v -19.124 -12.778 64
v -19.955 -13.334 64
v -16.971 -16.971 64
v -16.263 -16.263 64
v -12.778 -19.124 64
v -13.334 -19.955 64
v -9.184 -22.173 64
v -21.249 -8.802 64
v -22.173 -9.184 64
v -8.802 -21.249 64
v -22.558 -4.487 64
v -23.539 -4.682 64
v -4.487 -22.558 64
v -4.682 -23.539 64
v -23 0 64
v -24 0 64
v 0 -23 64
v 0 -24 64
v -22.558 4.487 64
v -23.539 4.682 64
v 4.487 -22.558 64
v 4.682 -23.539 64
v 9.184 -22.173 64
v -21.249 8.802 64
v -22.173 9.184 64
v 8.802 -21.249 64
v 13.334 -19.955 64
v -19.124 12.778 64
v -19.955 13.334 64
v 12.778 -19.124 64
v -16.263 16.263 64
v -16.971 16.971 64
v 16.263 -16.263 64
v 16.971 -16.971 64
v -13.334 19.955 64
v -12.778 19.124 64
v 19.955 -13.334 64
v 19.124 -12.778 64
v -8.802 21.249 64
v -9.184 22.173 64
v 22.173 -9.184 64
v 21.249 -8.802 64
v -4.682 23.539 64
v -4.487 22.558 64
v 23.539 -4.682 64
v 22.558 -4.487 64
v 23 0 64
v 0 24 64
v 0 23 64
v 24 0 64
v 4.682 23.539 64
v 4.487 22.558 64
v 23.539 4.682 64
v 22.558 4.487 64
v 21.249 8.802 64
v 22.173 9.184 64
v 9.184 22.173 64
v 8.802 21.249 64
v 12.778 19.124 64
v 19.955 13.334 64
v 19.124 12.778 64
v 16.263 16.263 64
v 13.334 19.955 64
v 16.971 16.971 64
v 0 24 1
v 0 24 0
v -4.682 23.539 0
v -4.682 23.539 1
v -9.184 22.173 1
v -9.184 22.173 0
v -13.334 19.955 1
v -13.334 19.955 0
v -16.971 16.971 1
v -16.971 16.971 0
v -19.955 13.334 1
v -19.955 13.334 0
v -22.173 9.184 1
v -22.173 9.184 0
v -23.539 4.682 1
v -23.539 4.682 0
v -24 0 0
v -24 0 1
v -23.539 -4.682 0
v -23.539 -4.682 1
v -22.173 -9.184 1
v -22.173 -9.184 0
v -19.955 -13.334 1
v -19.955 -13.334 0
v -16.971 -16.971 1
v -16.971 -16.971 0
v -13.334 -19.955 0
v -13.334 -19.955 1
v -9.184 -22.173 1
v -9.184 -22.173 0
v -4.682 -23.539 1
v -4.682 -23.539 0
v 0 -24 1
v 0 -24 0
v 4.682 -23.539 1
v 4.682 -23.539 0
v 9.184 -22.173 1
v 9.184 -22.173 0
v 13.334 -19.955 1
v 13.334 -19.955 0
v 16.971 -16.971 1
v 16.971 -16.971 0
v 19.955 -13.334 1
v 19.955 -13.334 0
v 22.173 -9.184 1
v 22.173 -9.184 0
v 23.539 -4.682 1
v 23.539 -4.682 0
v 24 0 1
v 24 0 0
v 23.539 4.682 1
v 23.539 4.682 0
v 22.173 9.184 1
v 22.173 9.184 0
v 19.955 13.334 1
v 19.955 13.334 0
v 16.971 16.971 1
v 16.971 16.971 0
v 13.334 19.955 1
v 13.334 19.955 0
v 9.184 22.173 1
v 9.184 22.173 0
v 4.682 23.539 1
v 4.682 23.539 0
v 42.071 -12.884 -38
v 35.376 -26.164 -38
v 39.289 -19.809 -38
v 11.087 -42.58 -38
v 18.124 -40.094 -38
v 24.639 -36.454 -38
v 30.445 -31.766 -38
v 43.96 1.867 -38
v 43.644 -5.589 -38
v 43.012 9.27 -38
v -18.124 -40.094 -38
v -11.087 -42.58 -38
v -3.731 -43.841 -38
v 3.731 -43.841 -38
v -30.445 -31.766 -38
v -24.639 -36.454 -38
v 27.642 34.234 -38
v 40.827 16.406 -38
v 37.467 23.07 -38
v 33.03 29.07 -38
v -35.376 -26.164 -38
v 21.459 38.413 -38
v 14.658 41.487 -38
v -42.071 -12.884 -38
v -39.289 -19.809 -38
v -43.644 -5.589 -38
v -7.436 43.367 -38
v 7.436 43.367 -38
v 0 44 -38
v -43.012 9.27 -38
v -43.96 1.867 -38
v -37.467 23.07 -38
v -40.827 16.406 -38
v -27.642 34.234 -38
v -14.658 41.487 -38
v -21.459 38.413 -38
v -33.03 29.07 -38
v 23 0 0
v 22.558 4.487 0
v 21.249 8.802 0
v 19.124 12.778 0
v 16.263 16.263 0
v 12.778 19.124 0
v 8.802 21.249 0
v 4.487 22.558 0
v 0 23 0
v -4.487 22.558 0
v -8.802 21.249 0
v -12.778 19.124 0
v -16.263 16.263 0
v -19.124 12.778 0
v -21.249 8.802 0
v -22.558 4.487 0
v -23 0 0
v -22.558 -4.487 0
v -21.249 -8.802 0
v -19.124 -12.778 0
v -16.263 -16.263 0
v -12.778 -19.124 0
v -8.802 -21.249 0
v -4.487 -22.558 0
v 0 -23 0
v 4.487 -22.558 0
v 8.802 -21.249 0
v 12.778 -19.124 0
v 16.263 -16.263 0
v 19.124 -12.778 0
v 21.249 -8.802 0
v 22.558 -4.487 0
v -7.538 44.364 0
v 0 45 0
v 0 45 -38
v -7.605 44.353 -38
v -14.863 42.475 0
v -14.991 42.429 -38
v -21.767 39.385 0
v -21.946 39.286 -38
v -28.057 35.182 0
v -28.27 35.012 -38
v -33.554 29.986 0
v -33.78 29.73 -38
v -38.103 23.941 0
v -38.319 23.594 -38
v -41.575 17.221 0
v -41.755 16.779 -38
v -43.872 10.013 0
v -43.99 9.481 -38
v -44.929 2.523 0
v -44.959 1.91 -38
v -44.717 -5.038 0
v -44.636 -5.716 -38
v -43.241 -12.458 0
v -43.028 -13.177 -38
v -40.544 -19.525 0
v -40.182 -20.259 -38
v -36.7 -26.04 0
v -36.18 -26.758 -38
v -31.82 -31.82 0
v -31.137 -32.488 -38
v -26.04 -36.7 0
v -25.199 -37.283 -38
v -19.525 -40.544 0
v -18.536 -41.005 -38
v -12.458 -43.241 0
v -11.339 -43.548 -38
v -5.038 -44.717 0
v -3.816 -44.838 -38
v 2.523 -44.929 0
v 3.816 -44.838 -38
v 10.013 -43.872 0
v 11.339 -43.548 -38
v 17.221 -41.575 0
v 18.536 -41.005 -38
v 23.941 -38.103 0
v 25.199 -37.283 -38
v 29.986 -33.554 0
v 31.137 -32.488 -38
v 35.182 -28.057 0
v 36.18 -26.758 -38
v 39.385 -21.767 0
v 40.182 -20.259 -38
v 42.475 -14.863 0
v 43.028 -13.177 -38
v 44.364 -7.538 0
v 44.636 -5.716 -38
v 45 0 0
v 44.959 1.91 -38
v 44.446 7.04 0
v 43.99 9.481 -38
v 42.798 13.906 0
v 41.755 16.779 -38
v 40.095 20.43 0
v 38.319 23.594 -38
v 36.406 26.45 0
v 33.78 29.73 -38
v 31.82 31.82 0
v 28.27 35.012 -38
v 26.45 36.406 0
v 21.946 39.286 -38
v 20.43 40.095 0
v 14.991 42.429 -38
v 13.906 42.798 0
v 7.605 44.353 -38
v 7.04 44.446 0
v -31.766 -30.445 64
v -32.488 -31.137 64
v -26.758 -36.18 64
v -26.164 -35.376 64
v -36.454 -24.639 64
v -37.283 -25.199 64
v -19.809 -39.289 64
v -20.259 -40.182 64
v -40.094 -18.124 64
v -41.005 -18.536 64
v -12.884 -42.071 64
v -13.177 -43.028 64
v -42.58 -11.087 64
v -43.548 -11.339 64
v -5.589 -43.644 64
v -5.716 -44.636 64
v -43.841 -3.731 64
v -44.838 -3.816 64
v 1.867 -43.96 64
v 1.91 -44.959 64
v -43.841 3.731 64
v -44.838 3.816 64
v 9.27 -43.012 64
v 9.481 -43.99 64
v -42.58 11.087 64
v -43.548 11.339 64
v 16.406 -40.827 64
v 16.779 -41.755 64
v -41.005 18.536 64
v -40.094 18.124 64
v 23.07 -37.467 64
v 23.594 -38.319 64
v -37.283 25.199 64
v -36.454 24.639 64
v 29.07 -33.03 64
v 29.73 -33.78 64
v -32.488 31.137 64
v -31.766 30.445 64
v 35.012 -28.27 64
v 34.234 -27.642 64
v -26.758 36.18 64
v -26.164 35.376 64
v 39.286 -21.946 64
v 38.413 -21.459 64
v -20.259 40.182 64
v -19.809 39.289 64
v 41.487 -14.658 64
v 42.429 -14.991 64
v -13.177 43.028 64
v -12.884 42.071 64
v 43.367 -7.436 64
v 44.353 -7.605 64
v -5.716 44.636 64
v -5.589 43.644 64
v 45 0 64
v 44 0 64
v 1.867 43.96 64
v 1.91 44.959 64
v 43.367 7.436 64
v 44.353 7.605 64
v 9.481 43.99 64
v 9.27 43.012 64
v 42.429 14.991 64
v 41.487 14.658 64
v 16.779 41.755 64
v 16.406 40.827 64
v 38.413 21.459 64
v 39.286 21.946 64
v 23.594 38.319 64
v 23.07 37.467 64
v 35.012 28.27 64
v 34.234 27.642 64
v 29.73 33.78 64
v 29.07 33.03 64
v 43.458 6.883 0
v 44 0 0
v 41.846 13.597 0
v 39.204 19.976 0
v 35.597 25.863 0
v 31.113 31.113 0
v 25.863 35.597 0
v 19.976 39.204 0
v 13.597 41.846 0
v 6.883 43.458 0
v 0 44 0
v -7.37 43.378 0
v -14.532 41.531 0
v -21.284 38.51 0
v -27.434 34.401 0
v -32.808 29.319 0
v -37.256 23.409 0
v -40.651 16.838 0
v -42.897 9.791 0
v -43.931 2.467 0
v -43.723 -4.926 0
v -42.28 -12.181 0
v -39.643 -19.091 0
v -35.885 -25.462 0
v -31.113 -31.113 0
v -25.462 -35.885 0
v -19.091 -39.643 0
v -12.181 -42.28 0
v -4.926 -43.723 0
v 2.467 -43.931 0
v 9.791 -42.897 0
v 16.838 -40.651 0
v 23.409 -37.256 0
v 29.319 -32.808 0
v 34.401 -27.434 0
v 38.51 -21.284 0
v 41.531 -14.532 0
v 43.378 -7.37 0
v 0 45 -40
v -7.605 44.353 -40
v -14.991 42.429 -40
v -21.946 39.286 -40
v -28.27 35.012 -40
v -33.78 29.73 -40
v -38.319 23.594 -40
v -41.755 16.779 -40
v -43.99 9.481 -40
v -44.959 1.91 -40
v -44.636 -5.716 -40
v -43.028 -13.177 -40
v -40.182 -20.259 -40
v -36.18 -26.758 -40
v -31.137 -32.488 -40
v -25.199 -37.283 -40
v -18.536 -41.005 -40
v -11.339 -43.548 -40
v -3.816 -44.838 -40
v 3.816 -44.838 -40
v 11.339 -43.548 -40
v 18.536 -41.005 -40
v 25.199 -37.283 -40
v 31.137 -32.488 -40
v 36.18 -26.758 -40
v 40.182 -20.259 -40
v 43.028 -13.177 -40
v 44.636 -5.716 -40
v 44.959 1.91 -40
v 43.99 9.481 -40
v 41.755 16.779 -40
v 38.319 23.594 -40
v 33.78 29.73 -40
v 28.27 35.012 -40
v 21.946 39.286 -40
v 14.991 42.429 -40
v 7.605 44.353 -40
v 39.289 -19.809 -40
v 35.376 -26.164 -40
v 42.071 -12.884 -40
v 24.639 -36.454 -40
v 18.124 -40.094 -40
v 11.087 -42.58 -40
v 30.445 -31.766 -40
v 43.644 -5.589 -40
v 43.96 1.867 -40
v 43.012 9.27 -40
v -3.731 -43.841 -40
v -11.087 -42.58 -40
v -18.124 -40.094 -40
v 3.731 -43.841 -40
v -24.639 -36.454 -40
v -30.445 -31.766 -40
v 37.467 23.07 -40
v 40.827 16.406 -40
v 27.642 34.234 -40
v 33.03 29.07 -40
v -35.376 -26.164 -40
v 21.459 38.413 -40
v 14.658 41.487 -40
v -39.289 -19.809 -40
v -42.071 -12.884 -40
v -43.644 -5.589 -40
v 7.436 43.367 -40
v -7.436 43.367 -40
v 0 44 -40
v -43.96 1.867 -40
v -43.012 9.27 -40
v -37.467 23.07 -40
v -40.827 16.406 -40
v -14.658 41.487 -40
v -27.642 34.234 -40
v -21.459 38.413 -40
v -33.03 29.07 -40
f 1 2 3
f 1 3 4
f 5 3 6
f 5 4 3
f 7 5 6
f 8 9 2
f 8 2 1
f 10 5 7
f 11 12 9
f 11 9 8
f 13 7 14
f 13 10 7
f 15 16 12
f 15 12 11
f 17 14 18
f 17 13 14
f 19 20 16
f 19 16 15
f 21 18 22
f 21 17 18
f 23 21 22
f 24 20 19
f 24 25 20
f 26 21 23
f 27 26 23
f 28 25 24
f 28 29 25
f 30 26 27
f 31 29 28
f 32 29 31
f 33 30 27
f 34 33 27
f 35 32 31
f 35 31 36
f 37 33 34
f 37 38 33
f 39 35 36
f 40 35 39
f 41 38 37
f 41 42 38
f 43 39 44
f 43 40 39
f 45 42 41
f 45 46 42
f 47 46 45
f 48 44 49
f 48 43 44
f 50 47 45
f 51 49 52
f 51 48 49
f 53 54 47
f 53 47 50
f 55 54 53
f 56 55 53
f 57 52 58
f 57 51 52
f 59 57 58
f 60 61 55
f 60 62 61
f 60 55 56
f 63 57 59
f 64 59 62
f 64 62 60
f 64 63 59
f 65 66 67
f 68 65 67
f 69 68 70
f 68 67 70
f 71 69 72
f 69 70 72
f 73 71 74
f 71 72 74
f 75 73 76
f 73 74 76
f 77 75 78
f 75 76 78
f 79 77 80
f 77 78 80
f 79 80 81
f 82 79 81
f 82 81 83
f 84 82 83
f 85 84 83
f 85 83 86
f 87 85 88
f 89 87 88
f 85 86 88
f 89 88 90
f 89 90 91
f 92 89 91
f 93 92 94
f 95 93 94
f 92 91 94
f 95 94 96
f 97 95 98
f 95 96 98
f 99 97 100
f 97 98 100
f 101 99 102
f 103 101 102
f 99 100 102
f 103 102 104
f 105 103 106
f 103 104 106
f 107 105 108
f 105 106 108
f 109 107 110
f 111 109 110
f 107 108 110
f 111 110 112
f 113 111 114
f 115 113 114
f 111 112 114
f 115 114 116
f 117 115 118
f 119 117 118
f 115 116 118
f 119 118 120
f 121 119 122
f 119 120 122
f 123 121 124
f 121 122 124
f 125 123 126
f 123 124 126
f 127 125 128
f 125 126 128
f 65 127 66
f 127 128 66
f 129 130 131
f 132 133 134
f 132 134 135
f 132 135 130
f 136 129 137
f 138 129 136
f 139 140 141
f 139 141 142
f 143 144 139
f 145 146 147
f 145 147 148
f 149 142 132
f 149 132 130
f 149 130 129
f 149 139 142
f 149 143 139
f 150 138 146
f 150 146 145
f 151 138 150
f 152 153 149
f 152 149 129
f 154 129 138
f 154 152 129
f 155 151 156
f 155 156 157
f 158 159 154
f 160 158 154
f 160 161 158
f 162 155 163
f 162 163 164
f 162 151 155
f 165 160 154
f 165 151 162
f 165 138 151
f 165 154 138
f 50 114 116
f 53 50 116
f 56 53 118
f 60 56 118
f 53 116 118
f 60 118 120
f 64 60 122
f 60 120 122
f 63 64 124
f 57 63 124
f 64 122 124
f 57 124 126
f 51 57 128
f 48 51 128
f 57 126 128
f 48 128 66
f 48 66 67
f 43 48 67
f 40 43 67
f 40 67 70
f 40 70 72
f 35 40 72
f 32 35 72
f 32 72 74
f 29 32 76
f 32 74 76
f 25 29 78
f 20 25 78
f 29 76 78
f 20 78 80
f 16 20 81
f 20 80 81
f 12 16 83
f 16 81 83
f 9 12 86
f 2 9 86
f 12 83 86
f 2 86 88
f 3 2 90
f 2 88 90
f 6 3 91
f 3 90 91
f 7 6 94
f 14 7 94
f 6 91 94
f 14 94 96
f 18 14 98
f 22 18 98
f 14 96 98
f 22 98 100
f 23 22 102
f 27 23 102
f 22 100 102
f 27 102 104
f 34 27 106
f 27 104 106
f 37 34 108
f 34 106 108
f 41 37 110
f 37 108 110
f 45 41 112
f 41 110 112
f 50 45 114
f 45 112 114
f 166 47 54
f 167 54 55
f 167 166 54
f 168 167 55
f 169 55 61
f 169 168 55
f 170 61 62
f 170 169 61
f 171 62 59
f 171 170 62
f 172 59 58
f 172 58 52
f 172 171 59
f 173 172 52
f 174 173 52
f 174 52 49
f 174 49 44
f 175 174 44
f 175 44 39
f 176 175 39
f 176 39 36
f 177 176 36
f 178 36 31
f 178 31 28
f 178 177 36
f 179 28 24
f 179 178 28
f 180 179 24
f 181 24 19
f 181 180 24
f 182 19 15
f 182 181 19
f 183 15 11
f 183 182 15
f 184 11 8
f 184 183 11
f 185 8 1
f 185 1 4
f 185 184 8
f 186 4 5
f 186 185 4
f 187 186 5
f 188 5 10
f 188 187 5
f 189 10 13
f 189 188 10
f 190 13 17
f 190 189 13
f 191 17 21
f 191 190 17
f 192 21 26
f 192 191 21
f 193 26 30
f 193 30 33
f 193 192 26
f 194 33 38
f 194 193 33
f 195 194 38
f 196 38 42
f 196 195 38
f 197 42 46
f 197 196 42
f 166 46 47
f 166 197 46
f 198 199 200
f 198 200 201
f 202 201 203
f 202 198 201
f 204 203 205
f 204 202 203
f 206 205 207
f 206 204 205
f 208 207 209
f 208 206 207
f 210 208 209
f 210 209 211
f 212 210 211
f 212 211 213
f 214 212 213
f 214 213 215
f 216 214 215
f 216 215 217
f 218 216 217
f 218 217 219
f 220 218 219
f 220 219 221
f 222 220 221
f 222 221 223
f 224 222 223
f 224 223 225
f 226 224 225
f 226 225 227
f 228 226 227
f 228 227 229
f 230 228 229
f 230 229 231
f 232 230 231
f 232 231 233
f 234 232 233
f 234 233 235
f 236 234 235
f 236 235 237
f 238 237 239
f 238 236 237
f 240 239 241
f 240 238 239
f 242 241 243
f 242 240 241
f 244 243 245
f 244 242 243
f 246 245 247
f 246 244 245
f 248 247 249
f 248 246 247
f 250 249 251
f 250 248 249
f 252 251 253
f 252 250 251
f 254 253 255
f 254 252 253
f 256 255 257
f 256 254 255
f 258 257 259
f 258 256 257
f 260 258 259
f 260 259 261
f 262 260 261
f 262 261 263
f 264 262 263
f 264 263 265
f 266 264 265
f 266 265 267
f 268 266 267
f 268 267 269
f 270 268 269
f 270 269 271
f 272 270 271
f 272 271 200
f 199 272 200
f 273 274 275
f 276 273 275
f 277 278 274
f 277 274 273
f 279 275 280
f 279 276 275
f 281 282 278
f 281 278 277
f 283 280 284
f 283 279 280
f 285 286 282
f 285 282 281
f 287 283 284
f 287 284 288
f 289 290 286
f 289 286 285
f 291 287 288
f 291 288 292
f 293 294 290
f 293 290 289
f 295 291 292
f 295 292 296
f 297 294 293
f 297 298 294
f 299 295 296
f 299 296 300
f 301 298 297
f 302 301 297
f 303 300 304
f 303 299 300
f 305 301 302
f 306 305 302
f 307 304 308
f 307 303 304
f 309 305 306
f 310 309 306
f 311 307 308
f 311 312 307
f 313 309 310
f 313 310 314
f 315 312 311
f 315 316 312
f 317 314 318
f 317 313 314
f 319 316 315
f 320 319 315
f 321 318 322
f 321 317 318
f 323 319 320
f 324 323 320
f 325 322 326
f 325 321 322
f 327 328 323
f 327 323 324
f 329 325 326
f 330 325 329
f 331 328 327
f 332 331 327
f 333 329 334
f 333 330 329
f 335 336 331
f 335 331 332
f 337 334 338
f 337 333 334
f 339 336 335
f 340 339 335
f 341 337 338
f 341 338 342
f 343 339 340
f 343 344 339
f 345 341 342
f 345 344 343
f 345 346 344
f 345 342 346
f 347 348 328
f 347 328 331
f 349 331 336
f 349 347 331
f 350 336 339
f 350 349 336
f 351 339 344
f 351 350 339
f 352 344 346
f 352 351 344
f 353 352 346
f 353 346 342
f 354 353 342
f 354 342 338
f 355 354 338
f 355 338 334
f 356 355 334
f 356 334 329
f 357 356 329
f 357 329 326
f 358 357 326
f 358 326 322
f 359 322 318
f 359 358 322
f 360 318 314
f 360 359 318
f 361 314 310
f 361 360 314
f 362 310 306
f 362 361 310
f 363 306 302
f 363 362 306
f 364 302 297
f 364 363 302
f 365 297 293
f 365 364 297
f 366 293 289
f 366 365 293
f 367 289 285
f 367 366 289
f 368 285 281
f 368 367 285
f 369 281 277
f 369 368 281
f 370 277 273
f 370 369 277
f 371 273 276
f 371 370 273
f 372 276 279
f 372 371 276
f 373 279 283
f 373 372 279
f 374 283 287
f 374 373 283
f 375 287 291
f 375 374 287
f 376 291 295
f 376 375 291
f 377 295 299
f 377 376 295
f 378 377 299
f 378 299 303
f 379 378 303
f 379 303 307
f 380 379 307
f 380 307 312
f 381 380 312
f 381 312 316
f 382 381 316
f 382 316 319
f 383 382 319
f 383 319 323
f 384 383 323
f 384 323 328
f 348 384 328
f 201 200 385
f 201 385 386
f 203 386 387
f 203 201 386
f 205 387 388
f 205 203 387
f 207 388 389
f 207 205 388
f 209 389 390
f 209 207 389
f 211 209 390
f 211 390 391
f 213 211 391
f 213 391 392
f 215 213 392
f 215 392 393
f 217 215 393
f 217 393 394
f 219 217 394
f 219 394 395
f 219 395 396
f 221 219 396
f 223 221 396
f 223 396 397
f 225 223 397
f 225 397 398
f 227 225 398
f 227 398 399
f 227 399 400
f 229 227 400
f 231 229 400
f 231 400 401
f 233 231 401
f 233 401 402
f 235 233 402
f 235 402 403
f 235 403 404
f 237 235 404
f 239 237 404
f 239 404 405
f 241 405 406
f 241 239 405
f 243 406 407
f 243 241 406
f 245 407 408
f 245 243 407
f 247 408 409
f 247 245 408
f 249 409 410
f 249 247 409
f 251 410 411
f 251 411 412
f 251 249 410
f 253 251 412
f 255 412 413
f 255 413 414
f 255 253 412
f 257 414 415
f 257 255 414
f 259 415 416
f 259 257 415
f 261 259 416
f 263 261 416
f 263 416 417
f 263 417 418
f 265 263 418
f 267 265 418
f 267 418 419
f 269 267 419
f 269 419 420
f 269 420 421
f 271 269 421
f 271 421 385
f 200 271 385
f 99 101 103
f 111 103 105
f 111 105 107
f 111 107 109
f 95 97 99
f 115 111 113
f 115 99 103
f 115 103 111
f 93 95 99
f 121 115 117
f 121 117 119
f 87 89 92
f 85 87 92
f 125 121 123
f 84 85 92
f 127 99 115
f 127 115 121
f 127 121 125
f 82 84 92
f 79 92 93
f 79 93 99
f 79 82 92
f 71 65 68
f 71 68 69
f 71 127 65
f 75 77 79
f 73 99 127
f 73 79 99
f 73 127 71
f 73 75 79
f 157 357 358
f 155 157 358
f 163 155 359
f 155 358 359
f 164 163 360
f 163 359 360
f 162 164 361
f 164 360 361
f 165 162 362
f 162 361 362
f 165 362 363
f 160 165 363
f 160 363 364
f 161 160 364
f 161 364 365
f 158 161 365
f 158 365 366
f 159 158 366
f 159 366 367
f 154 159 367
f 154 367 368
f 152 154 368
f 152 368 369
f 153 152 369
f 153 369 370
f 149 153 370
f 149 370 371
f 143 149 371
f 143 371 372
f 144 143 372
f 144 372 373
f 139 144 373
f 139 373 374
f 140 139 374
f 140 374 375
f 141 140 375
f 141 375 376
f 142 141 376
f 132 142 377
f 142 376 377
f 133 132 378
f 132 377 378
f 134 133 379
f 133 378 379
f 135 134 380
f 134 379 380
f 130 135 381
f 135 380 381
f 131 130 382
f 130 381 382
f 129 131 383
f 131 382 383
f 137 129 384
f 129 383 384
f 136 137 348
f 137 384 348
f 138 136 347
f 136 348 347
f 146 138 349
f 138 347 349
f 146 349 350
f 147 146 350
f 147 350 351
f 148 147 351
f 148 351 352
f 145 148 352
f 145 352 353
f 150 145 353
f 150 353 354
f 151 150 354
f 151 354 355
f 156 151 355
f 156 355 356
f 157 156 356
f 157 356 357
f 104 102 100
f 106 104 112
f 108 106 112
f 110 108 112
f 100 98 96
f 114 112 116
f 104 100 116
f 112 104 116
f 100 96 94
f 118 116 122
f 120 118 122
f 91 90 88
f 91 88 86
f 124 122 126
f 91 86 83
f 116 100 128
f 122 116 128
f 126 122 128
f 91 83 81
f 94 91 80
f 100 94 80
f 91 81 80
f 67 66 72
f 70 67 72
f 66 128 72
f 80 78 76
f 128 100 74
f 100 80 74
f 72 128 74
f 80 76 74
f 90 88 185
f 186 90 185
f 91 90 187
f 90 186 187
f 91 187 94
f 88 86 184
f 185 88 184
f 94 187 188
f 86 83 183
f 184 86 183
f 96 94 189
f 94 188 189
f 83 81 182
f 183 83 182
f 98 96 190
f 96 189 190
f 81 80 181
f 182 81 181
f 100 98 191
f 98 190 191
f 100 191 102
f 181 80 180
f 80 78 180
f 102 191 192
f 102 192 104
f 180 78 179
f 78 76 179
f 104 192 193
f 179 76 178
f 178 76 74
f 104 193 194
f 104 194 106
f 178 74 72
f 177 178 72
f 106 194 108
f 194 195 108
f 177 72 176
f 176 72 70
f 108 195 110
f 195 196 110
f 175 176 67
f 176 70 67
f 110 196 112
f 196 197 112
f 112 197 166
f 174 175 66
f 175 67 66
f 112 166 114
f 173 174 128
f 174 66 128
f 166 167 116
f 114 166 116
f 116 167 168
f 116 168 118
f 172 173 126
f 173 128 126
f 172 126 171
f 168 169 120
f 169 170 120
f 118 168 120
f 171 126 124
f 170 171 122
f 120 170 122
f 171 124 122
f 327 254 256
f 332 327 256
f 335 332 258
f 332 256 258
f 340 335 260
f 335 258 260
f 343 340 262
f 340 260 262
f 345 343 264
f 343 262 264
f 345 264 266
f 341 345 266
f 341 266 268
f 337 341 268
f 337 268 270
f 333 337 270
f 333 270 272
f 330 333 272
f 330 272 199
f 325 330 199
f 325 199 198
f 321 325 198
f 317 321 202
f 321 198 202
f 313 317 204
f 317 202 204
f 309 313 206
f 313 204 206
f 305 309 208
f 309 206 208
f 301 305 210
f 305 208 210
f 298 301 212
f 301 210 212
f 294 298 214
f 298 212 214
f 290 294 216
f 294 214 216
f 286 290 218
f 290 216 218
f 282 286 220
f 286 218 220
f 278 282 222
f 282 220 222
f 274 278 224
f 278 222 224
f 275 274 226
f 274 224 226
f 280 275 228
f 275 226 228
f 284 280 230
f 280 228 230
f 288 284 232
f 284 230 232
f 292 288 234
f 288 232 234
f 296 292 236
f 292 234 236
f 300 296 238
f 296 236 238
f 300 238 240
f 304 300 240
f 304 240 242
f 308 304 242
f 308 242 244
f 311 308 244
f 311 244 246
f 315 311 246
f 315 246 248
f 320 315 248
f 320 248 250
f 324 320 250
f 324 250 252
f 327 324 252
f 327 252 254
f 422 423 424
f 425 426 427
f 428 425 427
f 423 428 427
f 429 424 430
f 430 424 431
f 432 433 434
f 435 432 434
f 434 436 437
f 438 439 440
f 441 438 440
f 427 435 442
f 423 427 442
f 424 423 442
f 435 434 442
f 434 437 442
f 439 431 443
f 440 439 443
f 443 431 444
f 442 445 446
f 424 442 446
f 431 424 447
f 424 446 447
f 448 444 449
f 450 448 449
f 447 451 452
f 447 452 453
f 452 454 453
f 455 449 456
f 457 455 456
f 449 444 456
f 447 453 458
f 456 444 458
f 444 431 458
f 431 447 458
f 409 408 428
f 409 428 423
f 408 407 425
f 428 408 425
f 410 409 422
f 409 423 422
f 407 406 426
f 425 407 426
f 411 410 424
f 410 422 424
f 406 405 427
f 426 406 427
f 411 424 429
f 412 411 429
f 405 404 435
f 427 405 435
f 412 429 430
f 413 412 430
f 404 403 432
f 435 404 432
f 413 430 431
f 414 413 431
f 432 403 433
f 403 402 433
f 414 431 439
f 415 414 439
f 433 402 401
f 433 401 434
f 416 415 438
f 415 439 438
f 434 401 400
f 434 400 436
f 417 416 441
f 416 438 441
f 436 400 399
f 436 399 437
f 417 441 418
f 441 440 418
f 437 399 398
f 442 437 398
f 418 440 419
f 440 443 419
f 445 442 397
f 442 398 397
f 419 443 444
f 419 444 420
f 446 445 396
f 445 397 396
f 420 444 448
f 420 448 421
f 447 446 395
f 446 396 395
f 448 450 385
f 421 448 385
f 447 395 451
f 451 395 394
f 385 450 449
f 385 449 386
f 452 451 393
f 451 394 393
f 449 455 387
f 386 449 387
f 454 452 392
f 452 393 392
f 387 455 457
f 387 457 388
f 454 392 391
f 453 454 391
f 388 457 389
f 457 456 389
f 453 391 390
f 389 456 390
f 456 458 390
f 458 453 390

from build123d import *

# Parameters (mm, degrees)
BINDER_R      = 24
PAD002_DEPTH  = 1
SKETCH_R      = 24
SKETCH_R_2    = 23
PAD_DEPTH     = 64
SKETCH001_R   = 45
SKETCH001_R_2 = 44
PAD001_DEPTH  = 64
BINDER001_R   = 45
BINDER001_R_2 = 44
PAD003_DEPTH  = 40
BINDER002_R   = 45
PAD004_DEPTH  = 2


with BuildPart() as body:
    # Binder → Pad002 (new body)
    with BuildSketch(Plane(origin=(0, 0, 0), x_dir=(0, 1, 0), z_dir=(0, 0, 1))):
        Circle(BINDER_R)
    extrude(amount=PAD002_DEPTH)


with BuildPart() as pad:
    # Sketch → Pad (new body)
    with BuildSketch(Plane.XY):
        Circle(SKETCH_R)
        Circle(SKETCH_R_2, mode=Mode.SUBTRACT)
    extrude(amount=PAD_DEPTH)


with BuildPart() as body001:
    # Sketch001 → Pad001 (new body)
    with BuildSketch(Plane.XY):
        Circle(SKETCH001_R)
        Circle(SKETCH001_R_2, mode=Mode.SUBTRACT)
    extrude(amount=PAD001_DEPTH)

    # Binder001 → Pad003 (join)
    with BuildSketch(Plane(origin=(0, 0, 0), x_dir=(0, 1, 0), z_dir=(0, 0, 1))):
        Circle(BINDER001_R)
        Circle(BINDER001_R_2, mode=Mode.SUBTRACT)
    extrude(amount=-PAD003_DEPTH)

    # Binder002 → Pad004 (join)
    with BuildSketch(Plane(origin=(0, 0, -40), x_dir=(0, 1, 0), z_dir=(0, 0, 1))):
        Circle(BINDER002_R)
    extrude(amount=PAD004_DEPTH)


solid = Compound([body.part, pad.part, body001.part])
